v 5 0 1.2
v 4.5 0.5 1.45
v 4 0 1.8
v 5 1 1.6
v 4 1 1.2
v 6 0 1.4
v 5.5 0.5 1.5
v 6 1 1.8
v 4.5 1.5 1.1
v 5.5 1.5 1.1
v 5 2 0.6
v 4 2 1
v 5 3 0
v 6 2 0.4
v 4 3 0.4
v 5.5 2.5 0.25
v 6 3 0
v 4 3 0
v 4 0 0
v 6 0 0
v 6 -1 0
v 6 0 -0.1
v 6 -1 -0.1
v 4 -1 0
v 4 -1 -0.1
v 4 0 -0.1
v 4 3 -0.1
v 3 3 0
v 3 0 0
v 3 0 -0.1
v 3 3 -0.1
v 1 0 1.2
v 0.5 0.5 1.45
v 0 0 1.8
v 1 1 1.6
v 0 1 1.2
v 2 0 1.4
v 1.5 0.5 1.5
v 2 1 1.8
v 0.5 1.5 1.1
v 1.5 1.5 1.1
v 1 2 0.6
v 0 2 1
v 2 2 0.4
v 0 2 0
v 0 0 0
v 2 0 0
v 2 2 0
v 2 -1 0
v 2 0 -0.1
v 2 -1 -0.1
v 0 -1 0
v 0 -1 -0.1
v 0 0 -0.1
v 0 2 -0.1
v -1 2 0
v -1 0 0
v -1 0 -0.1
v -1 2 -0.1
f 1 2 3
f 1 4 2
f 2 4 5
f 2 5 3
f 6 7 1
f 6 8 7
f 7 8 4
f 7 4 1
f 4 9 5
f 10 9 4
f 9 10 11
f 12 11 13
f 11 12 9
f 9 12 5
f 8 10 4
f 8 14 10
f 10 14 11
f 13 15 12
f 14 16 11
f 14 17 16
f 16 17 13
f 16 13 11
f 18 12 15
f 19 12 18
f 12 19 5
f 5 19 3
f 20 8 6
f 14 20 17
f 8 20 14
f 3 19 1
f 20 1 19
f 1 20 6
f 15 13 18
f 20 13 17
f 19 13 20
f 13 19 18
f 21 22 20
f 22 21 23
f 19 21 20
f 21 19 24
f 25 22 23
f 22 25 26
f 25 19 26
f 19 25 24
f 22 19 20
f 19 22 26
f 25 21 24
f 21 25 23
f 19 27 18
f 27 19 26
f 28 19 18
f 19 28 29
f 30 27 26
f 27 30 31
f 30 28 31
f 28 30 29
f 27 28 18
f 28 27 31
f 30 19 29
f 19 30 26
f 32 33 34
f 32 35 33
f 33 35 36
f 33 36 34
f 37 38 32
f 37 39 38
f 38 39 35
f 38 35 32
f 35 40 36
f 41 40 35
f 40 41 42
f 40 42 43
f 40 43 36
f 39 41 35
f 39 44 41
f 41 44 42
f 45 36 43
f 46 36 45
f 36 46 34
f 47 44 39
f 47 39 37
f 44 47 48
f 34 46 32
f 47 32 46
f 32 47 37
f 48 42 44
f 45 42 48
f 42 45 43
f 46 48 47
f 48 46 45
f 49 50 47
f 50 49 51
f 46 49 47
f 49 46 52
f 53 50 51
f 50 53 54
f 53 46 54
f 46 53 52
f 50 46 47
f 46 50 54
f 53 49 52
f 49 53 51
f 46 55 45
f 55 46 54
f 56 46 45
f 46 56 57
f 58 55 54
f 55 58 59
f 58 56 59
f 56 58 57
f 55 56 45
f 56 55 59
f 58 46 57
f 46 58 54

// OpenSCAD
// .dat file has values from 2-9
scale([1,1,0.2]) surface("issue1223.dat");
translate([0,-1,-0.1]) cube([2,1,0.1]);
translate([-1,0,-0.1]) cube([1,2,0.1]);

// .dat file has incomplete last line
translate([4,0,0]) {
    scale([1,1,0.2]) surface("issue1223-2.dat");
    translate([0,-1,-0.1]) cube([2,1,0.1]);
    translate([-1,0,-0.1]) cube([1,3,0.1]);
}
